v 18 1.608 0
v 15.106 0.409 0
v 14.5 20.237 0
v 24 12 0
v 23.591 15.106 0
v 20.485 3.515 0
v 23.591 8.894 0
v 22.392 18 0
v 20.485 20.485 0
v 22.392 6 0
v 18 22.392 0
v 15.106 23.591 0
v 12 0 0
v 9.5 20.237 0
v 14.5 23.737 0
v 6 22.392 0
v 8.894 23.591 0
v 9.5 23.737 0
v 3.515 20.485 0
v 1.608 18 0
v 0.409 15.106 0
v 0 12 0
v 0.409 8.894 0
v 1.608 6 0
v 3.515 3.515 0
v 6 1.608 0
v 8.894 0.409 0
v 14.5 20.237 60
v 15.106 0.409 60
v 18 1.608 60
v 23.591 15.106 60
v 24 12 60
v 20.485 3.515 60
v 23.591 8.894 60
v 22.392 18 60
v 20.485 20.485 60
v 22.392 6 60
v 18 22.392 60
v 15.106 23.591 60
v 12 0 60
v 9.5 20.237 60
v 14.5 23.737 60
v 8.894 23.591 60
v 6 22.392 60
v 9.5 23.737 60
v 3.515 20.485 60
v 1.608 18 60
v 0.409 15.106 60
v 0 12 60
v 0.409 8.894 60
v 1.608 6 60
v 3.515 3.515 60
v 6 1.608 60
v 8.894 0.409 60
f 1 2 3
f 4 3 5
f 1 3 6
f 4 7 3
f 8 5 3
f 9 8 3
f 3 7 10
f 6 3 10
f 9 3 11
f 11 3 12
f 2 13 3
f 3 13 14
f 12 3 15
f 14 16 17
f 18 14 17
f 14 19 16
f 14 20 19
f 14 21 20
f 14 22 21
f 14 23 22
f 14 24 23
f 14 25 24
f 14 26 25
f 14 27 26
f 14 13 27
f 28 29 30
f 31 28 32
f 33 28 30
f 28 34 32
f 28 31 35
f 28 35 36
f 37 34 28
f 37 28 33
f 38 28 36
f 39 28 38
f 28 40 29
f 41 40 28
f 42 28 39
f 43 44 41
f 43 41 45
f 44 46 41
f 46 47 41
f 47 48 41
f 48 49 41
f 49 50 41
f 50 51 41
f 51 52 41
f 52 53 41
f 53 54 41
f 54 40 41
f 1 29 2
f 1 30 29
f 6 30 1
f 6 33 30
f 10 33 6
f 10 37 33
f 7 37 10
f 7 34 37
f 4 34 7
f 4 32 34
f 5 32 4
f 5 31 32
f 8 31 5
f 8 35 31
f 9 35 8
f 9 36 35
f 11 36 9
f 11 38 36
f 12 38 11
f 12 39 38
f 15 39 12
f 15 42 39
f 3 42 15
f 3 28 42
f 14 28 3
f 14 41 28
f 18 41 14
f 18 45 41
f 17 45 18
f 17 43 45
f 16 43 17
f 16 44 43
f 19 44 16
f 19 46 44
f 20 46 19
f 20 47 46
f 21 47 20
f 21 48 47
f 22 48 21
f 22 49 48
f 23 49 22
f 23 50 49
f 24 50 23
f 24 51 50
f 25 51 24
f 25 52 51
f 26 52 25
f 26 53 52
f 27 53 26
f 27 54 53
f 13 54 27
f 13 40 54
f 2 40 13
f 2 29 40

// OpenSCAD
$fn = 32;

// ----------------------------------------------------------------------
// Keyway shaft: d24 shaft, key 5 x 3.5 mm
// ----------------------------------------------------------------------

// --- parameters (mm) ---
shaft_r = 12;             // shaft radius
key_w = 5;                // keyway width
key_d = 3.5;              // keyway depth below the surface line
plate_t = 60;             // shaft length, Z (extrusion height)

shaft_d = 2 * shaft_r;  // shaft diameter
circle_step = 15;  // polygon sampling step, degrees

profile = [[8.894, 23.591], [6, 22.392], [3.515, 20.485], [1.608, 18], [0.409, 15.106], [0, 12], [0.409, 8.894], [1.608, 6], [3.515, 3.515], [6, 1.608], [8.894, 0.409], [12, 0], [15.106, 0.409], [18, 1.608], [20.485, 3.515], [22.392, 6], [23.591, 8.894], [24, 12], [23.591, 15.106], [22.392, 18], [20.485, 20.485], [18, 22.392], [15.106, 23.591], [14.5, 23.737], [14.5, 20.237], [9.5, 20.237], [9.5, 23.737]];  // primary outline, 27 points, counter clockwise

// --- the one profile operation ---
linear_extrude(height = plate_t) polygon(points = profile);
